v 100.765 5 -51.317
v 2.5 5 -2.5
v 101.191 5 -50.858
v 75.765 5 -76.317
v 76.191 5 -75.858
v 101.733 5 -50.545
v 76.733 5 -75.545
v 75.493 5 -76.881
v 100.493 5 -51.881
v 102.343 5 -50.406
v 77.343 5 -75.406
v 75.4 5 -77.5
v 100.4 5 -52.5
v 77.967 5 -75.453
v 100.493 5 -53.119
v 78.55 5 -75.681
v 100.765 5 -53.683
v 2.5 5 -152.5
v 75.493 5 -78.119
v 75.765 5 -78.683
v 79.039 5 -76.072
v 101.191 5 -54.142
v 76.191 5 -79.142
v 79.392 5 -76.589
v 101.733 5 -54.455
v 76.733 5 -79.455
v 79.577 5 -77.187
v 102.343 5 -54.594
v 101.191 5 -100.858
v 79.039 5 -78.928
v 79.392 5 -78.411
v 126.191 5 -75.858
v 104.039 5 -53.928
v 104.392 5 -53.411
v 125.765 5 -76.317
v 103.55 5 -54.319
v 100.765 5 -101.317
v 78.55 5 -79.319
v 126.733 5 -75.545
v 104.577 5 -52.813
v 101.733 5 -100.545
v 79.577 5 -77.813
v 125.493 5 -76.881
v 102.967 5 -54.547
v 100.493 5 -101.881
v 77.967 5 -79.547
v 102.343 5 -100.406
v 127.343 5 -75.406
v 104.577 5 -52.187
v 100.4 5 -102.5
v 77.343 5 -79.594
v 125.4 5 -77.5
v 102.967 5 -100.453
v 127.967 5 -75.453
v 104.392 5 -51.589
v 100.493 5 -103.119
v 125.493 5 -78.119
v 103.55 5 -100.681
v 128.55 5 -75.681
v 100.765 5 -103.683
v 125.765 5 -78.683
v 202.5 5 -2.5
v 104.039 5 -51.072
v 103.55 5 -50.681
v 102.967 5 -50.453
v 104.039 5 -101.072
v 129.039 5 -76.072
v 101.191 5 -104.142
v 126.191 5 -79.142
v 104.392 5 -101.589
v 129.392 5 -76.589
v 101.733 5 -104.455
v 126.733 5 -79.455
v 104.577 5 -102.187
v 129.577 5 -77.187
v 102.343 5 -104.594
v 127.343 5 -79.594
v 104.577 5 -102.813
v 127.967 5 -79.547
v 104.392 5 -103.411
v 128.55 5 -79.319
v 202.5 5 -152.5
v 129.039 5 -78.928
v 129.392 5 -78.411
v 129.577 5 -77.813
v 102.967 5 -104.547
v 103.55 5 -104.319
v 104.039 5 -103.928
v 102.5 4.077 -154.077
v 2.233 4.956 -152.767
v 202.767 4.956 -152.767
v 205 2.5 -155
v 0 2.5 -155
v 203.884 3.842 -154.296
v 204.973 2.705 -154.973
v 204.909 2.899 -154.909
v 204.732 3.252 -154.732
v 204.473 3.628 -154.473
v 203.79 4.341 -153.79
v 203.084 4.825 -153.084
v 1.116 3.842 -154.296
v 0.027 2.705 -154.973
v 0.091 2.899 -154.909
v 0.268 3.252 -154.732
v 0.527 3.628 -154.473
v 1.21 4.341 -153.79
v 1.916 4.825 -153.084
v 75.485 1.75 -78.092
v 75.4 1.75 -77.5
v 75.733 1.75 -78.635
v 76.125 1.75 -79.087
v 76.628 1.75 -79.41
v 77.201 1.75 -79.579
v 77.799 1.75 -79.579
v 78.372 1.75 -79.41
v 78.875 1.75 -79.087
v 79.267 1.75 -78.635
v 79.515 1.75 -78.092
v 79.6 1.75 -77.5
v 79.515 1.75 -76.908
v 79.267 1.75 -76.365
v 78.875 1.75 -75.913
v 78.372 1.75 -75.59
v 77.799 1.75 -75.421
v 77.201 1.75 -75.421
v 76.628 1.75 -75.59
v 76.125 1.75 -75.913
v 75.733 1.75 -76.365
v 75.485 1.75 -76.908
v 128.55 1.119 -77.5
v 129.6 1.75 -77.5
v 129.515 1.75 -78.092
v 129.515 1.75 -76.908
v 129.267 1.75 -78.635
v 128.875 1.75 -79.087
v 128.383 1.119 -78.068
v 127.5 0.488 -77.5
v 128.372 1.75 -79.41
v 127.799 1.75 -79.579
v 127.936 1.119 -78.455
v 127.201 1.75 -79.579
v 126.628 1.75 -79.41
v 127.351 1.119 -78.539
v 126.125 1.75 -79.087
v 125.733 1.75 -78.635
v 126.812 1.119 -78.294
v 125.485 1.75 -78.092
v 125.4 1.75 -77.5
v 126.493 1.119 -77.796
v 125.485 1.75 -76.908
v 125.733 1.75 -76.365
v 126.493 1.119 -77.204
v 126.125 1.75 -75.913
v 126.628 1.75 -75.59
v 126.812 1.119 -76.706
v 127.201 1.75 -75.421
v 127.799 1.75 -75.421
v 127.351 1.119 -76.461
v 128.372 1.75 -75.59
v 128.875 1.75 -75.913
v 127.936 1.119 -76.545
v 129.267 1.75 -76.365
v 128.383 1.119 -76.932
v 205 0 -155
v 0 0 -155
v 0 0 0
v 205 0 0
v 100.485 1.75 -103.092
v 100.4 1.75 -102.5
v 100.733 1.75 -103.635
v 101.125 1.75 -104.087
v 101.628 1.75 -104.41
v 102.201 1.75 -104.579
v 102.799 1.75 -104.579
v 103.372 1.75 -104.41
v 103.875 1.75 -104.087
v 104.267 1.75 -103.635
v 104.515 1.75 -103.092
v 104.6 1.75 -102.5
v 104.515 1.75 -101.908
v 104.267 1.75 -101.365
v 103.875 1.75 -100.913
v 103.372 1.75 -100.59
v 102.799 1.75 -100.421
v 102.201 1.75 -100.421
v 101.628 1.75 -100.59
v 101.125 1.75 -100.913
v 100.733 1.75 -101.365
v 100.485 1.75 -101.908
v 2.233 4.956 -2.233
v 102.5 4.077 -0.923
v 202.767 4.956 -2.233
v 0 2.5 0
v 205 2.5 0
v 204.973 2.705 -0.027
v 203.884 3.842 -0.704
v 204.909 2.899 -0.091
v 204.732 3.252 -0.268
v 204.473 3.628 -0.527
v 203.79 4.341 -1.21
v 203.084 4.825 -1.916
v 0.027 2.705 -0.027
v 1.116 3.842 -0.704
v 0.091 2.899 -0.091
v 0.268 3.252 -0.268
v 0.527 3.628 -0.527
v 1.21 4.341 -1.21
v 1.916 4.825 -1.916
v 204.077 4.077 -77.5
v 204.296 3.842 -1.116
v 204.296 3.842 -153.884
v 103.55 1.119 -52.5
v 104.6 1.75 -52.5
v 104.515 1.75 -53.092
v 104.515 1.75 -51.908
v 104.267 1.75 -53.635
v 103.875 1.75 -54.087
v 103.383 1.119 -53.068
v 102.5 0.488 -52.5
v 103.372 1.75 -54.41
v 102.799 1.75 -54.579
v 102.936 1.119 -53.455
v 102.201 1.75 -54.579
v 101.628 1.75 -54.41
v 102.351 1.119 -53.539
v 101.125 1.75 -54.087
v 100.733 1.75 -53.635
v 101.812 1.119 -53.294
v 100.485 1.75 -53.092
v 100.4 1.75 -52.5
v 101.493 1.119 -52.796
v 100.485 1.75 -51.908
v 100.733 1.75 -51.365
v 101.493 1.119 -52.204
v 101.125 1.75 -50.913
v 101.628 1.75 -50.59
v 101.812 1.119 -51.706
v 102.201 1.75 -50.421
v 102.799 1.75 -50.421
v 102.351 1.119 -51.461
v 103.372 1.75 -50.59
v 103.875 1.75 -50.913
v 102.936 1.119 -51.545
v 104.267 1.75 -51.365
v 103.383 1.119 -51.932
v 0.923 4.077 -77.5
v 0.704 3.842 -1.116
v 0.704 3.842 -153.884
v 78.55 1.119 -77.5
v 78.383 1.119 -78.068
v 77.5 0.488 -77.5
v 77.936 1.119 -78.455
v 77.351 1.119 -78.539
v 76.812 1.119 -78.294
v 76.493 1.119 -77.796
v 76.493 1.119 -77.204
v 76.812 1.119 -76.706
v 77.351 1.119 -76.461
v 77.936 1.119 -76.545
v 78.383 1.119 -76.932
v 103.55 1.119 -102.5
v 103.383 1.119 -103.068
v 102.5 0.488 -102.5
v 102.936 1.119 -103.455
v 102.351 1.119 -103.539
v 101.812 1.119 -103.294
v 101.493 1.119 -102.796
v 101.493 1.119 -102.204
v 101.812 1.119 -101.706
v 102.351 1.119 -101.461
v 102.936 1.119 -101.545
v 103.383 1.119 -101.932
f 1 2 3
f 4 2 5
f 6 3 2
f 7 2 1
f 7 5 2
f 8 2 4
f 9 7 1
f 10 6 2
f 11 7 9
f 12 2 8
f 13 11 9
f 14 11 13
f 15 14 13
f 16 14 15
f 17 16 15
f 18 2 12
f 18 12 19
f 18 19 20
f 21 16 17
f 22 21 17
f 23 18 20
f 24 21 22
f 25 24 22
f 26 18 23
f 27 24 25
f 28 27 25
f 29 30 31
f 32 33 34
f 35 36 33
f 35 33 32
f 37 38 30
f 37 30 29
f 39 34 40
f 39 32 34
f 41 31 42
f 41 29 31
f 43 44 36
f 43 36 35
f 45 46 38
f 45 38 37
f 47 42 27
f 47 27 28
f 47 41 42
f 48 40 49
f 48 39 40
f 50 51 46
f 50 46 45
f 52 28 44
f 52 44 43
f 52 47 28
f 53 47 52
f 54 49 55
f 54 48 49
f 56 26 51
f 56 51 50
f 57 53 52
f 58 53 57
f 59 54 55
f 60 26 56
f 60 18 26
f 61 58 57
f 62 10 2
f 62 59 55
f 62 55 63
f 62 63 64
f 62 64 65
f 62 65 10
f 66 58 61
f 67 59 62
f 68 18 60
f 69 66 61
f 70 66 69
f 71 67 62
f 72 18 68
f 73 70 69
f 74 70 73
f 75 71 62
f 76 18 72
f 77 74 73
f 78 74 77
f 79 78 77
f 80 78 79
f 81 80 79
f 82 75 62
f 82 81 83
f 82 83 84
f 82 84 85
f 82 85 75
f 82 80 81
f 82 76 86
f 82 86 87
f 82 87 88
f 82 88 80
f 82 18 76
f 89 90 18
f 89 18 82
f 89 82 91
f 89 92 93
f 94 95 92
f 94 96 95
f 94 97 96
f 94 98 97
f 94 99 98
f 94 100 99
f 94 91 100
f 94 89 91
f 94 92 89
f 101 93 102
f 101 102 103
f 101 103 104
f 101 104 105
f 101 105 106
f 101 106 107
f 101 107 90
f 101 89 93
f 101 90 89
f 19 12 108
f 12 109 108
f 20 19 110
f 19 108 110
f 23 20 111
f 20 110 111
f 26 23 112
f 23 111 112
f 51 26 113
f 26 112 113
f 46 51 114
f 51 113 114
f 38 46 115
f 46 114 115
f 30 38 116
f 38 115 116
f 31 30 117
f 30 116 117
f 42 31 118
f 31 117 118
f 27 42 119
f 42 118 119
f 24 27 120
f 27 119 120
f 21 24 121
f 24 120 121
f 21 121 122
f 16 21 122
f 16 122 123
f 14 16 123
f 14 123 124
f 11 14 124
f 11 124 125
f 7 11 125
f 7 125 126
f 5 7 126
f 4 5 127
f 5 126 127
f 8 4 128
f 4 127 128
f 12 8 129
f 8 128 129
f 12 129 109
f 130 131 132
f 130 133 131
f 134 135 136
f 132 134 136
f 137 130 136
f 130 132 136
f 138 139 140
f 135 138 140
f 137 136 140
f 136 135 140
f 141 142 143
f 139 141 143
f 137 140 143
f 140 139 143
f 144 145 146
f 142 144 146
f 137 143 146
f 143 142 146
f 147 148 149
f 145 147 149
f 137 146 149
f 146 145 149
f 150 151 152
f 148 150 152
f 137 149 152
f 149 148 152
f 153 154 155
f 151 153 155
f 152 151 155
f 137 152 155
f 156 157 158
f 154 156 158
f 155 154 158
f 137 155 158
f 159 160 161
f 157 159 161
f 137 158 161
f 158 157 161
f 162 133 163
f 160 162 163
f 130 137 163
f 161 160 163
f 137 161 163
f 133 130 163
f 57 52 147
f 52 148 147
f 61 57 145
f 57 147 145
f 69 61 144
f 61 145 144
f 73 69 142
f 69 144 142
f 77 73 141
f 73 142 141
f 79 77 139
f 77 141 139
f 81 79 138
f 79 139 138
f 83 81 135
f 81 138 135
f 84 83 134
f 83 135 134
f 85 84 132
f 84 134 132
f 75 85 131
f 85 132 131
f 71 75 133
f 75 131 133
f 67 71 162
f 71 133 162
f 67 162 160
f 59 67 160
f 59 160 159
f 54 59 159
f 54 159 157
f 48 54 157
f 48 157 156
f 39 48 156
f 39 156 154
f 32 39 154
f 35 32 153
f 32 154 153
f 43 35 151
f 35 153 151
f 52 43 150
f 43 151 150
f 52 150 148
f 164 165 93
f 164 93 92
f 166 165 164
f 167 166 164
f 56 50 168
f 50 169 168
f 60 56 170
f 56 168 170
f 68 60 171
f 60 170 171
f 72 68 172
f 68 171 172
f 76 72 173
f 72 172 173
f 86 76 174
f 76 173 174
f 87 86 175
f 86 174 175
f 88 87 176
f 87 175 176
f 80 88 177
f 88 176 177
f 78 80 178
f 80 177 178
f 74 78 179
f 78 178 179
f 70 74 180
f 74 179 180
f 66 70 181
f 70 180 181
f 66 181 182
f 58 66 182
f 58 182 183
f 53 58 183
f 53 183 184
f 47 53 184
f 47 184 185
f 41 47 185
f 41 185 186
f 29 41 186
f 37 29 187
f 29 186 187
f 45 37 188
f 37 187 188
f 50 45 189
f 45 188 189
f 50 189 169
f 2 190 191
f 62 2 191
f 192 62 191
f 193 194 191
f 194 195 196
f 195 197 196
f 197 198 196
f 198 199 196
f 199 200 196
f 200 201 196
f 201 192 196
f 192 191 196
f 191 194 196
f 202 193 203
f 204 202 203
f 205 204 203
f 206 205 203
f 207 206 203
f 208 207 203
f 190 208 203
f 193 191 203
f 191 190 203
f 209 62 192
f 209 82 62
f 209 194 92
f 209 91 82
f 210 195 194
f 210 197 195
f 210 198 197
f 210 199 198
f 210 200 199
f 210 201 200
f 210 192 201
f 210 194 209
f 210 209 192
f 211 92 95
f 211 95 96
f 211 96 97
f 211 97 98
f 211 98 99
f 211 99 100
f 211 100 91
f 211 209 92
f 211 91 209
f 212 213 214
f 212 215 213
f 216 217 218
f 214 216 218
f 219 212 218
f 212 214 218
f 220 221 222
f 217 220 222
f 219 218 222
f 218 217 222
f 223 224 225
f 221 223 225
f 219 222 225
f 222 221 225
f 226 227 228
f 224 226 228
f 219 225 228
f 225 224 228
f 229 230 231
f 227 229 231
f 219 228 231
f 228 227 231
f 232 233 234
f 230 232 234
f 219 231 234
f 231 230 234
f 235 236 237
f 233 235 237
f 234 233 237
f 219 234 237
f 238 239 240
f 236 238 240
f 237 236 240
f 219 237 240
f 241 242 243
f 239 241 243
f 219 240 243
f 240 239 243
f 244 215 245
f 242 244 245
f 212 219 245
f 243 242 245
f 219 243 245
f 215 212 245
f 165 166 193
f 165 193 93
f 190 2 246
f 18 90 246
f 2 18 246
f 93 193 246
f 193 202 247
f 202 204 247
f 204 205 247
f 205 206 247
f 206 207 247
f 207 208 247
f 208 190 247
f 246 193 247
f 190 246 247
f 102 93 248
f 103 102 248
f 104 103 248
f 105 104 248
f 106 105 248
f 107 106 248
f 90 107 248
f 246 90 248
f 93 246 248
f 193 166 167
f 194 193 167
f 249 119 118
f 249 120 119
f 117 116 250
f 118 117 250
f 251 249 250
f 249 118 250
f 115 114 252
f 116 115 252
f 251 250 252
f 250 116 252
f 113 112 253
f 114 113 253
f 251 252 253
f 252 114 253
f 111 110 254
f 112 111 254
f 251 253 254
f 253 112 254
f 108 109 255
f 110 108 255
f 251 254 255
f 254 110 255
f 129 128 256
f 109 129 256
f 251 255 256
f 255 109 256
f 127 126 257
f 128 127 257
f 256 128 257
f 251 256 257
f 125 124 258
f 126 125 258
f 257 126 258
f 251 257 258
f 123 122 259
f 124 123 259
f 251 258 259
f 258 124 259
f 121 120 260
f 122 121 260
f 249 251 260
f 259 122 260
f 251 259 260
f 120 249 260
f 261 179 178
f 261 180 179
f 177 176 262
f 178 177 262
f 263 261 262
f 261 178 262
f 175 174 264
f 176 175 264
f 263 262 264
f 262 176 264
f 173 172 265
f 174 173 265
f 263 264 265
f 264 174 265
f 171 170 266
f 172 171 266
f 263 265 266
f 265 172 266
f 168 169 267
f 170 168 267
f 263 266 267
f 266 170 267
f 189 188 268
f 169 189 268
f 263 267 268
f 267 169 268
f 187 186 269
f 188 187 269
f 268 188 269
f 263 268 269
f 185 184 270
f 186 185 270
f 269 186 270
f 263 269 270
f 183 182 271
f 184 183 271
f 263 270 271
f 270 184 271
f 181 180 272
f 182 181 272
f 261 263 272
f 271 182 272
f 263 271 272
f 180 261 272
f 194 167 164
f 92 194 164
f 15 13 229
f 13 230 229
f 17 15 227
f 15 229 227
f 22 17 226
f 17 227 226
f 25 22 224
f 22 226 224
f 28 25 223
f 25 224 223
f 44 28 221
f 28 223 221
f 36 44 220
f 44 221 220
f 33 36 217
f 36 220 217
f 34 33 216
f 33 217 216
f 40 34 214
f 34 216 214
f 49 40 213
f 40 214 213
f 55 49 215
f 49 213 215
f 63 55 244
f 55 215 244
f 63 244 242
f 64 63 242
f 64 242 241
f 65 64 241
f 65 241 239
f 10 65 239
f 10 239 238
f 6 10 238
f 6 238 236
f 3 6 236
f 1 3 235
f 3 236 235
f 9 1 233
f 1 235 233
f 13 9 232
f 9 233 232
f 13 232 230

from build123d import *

# Parameters (mm, degrees)
CROQUIS1_W                                   = 205
CROQUIS1_H                                   = 155
SALIENTE_EXTRUIR1_DEPTH                      = 5
REDONDEO1_DEPTH                              = 205
REDONDEO1_START                              = -156
REDONDEO1_2_DEPTH                            = 157
CROQUIS2_R                                   = 1.5
CORTAR_EXTRUIR1_DEPTH                        = 3
PERFORADOR_PARA_ROSCAR_HELICOIL_DE_M41_D     = 4.2
PERFORADOR_PARA_ROSCAR_HELICOIL_DE_M41_DEPTH = 3.25
PERFORADOR_PARA_ROSCAR_HELICOIL_DE_M41_TIP   = 1.2618073


with BuildPart() as part:
    # Croquis1 → Saliente-Extruir1 (new body)
    with BuildSketch(Plane(origin=(0, 0, 0), x_dir=(1, 0, 0), z_dir=(0, 1, 0))):
        with Locations((102.5, 77.5)):
            Rectangle(CROQUIS1_W, CROQUIS1_H)
    extrude(amount=SALIENTE_EXTRUIR1_DEPTH)

    # Redondeo1: read off the stored shape, not the designer's step
    # Redondeo1 outline → Redondeo1 (cut)
    with BuildSketch(Plane.YZ):
        with BuildLine():
            Line((5, -155), (5, -152.5))
            add(Edge.make_bspline(
                [(5, -152.5), (5, -155), (2.5, -155)],
                knots=[0, 0, 0, 1, 1, 1], degree=2, weights=[1, 0.353553391, 1]))
            Line((2.5, -155), (5, -155))
        make_face()
        with BuildLine():
            add(Edge.make_bspline(
                [(5, -2.5), (5, 0), (2.5, 0)],
                knots=[0, 0, 0, 1, 1, 1], degree=2, weights=[1, 0.353553391, 1]))
            Line((5, -2.5), (5, 0))
            Line((5, 0), (2.5, 0))
        make_face()
    extrude(amount=REDONDEO1_DEPTH, mode=Mode.SUBTRACT)

    # Redondeo1 2 outline → Redondeo1 2 (cut)
    with BuildSketch(Plane.XY.offset(REDONDEO1_START)):
        with BuildLine():
            Line((205, 5), (202.5, 5))
            add(Edge.make_bspline(
                [(202.5, 5), (205, 5), (205, 2.5)],
                knots=[0, 0, 0, 1, 1, 1], degree=2, weights=[1, 0.353553391, 1]))
            Line((205, 2.5), (205, 5))
        make_face()
        with BuildLine():
            add(Edge.make_bspline(
                [(2.5, 5), (0, 5), (0, 2.5)],
                knots=[0, 0, 0, 1, 1, 1], degree=2, weights=[1, 0.353553391, 1]))
            Line((2.5, 5), (0, 5))
            Line((0, 5), (0, 2.5))
        make_face()
    extrude(amount=REDONDEO1_2_DEPTH, mode=Mode.SUBTRACT)

    # Croquis2 → Cortar-Extruir1 (cut)
    with BuildSketch(Plane(origin=(0, 5, 0), x_dir=(1, 0, 0), z_dir=(0, 1, 0))):
        with Locations(Location((77.5, 77.5, 0), (0, 0, 270))):
            Circle(CROQUIS2_R)
        with Locations(Location((102.5, 102.5, 0), (0, 0, 270))):
            Circle(CROQUIS2_R)
        with Locations(Location((127.5, 77.5, 0), (0, 0, 270))):
            Circle(CROQUIS2_R)
        with Locations(Location((102.5, 52.5, 0), (0, 0, 270))):
            Circle(CROQUIS2_R)
    extrude(amount=-CORTAR_EXTRUIR1_DEPTH, mode=Mode.SUBTRACT)

    # Perforador para roscar Helicoil de M41
    with Locations(Plane(origin=(0, 5, 0), x_dir=(1, 0, 0), z_dir=(0, 1, 0))):
        with Locations((77.5, 77.5), (102.5, 102.5), (127.5, 77.5), (102.5, 52.5)):
            Hole(PERFORADOR_PARA_ROSCAR_HELICOIL_DE_M41_D / 2, depth=PERFORADOR_PARA_ROSCAR_HELICOIL_DE_M41_DEPTH)
            with Locations((0, 0, -(PERFORADOR_PARA_ROSCAR_HELICOIL_DE_M41_DEPTH + PERFORADOR_PARA_ROSCAR_HELICOIL_DE_M41_TIP / 2))):  # 118° drill point
                Cone(0, PERFORADOR_PARA_ROSCAR_HELICOIL_DE_M41_D / 2, PERFORADOR_PARA_ROSCAR_HELICOIL_DE_M41_TIP, mode=Mode.SUBTRACT)


solid = part.part
